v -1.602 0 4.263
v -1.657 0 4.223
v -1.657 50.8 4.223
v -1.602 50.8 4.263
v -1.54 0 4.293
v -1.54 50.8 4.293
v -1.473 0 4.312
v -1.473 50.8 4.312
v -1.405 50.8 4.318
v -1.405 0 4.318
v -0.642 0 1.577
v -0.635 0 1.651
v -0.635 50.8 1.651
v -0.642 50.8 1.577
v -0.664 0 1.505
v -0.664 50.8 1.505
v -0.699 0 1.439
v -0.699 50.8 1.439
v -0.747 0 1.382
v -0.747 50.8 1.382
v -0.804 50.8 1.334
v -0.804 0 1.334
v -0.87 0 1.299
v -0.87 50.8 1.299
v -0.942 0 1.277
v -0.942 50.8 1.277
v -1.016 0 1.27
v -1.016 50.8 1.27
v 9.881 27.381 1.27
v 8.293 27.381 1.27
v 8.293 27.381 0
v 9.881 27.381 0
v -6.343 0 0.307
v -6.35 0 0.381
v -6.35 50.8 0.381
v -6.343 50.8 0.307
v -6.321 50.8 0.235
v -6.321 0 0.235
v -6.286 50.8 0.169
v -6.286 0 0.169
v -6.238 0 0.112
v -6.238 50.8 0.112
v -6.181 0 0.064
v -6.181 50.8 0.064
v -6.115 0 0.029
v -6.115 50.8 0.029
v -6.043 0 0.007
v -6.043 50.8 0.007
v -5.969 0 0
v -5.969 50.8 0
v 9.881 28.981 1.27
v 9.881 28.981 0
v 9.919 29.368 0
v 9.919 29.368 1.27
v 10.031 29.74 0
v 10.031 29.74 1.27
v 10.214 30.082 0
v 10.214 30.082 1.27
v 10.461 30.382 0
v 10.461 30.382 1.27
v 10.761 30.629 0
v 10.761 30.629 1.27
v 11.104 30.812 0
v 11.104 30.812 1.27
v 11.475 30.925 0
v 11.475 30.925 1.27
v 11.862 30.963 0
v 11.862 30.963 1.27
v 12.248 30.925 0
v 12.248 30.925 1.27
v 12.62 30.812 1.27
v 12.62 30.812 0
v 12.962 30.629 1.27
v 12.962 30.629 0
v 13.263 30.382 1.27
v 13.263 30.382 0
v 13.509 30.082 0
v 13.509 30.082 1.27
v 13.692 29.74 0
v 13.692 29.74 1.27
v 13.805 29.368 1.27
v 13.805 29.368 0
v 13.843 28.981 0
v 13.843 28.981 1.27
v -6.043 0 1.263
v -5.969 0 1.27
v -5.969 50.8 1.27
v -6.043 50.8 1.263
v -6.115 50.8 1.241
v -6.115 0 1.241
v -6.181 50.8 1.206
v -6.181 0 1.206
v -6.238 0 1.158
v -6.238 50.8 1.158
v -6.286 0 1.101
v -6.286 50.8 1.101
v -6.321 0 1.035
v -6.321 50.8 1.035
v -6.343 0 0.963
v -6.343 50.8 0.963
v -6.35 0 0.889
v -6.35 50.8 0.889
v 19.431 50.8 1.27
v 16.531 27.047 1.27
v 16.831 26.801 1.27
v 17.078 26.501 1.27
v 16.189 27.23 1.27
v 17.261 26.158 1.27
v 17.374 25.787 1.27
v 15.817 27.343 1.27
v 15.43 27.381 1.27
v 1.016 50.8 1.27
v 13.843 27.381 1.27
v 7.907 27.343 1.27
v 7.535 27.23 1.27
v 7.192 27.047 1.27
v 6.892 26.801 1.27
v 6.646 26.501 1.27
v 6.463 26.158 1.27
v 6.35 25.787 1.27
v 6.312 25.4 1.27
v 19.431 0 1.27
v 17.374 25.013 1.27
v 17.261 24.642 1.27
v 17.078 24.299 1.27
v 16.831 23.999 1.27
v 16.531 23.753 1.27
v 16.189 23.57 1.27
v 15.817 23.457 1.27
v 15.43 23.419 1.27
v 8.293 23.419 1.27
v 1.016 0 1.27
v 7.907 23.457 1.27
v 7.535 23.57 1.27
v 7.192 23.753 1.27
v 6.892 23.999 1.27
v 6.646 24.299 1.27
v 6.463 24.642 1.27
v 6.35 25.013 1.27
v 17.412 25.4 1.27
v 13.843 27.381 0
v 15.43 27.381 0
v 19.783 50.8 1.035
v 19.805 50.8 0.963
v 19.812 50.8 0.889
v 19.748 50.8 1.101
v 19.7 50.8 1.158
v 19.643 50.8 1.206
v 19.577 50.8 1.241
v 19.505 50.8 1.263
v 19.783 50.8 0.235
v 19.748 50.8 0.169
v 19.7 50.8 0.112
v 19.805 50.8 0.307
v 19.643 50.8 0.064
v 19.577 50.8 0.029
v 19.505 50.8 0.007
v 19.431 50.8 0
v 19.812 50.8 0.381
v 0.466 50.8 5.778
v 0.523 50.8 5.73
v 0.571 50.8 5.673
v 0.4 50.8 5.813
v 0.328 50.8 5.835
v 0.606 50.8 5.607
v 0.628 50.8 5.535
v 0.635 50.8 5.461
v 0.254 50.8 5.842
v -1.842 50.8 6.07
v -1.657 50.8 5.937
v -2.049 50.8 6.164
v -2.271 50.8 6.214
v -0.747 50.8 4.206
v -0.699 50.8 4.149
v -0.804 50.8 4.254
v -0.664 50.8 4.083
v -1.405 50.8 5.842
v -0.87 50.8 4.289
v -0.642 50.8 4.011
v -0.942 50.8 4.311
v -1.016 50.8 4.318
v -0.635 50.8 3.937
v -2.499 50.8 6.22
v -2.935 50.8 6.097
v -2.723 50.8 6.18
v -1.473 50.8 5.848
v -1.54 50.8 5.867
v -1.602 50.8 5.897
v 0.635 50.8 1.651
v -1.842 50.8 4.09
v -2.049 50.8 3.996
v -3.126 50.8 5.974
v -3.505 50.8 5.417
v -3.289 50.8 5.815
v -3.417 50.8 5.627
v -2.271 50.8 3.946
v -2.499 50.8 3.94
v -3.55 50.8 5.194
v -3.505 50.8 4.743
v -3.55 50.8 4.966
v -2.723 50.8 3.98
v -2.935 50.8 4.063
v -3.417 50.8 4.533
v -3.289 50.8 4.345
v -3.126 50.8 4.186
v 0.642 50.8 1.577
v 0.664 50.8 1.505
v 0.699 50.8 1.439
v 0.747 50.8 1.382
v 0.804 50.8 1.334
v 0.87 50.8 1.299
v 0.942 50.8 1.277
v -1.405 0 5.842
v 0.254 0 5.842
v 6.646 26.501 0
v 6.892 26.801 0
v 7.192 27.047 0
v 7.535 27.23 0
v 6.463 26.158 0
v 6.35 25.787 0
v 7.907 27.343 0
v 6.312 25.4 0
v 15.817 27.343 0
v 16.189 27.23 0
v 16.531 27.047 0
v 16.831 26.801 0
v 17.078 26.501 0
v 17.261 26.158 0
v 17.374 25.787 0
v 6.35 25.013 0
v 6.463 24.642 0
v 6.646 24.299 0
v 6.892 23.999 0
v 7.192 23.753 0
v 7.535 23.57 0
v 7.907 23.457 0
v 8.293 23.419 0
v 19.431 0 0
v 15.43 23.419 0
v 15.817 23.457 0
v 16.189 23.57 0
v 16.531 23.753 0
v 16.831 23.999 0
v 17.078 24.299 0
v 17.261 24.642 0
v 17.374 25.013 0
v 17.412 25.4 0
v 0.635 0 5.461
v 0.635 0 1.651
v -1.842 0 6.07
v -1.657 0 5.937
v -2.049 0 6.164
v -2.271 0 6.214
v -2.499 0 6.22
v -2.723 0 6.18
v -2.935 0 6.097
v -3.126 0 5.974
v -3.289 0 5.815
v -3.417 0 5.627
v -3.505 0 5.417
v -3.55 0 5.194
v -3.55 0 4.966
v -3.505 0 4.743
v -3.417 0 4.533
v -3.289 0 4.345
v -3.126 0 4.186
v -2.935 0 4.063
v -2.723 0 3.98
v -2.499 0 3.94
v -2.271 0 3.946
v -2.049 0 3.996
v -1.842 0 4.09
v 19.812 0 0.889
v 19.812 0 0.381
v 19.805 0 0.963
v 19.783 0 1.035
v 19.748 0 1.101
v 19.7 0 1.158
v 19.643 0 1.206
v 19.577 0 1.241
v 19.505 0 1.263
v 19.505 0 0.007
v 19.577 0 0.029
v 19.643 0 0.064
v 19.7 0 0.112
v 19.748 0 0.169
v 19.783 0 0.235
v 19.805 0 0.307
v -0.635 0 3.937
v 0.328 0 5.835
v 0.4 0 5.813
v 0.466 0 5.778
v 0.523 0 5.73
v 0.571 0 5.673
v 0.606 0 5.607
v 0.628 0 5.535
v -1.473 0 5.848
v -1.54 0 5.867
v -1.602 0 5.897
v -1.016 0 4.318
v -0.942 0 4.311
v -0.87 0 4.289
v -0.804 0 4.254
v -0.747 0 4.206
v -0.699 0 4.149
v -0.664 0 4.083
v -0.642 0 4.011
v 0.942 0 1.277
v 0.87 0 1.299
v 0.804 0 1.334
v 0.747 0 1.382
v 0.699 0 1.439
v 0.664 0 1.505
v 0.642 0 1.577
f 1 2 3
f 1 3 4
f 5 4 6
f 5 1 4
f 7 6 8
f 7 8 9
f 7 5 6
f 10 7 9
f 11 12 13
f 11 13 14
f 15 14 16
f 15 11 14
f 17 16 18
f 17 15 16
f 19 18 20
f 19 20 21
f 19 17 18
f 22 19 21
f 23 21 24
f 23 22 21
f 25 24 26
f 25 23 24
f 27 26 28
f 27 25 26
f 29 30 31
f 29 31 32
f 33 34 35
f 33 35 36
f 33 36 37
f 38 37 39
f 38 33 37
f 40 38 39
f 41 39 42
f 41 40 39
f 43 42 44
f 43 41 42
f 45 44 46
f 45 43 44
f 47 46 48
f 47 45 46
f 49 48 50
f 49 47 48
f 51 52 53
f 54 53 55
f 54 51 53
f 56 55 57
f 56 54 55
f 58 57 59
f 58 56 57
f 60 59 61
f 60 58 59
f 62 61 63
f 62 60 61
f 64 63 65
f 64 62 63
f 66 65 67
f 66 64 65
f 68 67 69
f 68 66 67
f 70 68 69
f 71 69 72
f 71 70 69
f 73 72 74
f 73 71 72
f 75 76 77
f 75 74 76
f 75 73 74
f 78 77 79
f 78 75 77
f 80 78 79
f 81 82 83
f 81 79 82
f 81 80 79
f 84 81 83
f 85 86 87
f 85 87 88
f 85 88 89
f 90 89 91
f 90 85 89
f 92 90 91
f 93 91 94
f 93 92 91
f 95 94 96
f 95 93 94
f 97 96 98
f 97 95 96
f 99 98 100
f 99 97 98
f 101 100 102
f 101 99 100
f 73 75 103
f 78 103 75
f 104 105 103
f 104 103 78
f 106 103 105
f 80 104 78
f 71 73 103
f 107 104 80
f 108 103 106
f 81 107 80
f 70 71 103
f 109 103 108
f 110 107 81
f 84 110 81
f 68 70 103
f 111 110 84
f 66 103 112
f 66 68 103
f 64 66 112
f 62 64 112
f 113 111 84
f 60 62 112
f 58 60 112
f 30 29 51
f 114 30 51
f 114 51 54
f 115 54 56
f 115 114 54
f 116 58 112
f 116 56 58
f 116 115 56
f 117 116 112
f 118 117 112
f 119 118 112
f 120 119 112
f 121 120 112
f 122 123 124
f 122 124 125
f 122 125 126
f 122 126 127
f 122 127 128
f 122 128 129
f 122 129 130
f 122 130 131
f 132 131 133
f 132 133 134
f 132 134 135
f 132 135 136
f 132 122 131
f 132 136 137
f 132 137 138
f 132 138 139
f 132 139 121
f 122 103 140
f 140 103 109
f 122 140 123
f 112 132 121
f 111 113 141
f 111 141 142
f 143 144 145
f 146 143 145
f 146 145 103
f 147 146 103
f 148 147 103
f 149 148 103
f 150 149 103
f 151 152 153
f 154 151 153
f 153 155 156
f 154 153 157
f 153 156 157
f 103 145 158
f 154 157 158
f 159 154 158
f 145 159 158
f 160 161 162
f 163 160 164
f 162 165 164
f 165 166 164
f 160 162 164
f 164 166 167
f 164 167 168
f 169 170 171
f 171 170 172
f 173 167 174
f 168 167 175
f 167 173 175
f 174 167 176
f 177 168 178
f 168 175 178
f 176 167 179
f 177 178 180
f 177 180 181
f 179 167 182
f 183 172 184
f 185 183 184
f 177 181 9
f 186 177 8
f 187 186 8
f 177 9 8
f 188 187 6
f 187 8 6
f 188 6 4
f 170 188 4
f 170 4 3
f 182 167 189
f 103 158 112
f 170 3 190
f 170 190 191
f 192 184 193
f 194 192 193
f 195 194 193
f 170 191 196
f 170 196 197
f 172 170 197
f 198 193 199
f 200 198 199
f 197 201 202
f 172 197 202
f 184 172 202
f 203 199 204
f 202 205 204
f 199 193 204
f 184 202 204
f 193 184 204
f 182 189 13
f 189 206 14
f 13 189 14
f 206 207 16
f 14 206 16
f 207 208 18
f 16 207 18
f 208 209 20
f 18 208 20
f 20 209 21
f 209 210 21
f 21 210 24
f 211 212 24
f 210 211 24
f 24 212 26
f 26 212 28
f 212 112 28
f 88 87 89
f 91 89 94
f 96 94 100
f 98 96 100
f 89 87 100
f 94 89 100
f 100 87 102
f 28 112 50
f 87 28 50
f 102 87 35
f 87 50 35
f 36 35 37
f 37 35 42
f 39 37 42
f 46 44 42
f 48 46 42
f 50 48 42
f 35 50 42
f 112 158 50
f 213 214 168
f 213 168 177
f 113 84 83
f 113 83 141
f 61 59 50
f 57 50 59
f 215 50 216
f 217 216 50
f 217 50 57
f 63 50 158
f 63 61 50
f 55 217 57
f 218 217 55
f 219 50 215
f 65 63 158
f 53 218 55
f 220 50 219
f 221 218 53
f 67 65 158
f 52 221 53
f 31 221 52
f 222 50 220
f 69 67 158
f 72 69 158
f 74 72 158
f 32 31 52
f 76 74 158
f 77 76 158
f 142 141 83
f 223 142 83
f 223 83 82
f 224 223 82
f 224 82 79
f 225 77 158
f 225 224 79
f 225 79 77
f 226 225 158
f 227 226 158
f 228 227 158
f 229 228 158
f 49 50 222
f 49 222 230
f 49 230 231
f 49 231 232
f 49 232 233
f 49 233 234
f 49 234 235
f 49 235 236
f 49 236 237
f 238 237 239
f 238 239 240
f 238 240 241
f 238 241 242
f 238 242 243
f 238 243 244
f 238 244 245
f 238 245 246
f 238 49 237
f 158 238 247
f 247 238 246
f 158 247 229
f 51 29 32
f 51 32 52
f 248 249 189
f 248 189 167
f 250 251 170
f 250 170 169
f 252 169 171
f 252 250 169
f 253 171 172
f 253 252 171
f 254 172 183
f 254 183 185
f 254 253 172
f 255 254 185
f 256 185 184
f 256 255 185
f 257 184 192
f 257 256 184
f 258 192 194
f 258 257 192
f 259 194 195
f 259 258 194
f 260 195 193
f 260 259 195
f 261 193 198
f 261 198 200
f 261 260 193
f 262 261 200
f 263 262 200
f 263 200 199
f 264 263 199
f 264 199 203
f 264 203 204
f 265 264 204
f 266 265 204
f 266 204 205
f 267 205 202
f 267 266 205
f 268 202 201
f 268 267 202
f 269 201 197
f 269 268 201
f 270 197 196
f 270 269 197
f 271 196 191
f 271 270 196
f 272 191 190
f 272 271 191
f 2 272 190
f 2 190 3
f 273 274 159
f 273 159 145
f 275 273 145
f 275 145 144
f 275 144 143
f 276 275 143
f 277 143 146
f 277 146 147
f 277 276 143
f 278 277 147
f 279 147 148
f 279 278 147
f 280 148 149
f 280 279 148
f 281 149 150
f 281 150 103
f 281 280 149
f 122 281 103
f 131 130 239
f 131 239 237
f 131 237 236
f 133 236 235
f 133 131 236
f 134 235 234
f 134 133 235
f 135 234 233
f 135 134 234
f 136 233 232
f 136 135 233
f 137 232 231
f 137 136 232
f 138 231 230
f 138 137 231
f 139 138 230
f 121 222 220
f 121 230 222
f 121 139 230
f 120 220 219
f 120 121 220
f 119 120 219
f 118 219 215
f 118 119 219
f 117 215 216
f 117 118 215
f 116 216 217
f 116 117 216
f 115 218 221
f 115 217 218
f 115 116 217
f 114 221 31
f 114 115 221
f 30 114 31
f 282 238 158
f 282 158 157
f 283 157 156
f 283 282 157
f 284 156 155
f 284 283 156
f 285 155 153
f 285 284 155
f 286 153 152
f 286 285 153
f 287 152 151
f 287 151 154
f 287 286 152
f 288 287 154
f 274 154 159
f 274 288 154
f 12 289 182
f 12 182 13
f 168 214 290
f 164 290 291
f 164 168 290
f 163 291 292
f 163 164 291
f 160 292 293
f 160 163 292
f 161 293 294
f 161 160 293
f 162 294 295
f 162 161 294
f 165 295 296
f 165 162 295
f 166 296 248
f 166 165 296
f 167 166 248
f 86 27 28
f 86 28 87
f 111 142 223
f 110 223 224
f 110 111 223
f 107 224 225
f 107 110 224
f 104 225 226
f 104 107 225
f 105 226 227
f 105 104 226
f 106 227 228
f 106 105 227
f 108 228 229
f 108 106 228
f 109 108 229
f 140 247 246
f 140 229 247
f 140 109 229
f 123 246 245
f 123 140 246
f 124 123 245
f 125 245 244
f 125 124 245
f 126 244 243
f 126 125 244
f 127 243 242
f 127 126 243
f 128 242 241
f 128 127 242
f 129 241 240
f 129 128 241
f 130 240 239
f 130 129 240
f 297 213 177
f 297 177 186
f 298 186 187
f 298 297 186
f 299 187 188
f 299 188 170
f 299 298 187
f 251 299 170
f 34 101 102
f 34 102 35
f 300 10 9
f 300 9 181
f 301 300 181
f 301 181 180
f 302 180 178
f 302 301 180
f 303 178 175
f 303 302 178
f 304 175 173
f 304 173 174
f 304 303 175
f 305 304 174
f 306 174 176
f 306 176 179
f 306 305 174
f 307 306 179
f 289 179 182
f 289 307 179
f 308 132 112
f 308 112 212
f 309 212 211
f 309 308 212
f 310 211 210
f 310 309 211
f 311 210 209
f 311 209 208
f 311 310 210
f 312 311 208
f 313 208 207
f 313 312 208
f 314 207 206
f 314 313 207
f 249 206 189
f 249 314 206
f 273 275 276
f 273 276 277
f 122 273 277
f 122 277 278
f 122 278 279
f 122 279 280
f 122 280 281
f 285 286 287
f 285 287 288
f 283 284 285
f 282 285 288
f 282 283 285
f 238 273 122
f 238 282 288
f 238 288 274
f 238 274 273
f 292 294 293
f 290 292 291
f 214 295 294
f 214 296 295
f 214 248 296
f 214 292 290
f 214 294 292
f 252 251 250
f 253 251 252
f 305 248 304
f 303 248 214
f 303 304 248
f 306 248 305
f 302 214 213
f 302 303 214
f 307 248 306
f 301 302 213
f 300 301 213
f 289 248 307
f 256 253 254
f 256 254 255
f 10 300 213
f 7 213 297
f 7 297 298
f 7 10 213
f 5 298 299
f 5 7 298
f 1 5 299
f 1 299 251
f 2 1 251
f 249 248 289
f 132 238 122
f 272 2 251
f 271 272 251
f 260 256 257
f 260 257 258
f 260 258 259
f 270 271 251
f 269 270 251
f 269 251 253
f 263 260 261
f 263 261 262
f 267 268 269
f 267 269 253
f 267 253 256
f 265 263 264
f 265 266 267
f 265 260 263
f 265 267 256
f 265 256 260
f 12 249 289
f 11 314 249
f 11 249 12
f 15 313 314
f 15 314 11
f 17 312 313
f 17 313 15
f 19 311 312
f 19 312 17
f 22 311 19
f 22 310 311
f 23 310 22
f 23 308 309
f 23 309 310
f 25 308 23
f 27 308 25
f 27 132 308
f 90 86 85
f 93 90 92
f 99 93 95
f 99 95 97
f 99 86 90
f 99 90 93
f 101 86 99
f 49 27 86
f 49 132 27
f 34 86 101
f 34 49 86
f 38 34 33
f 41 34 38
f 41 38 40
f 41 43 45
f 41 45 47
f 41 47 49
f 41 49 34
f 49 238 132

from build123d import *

# Parameters (mm, degrees)
BOSS_EXTRUDE1_DEPTH = 50.8
SKETCH4_W           = 2.921
SKETCH4_H           = 4.572
CUT_EXTRUDE2_DEPTH  = 51.8
FILLET1_R           = 0.381
CUT_EXTRUDE1_DEPTH  = 2.27


with BuildPart() as part:
    # Sketch2 → Boss-Extrude1 (new body)
    with BuildSketch(Plane(origin=(0, 0, 0), x_dir=(1, 0, 0), z_dir=(0, 1, 0))):
        with BuildLine():
            Line((-5.969, 0), (19.431, 0))
            ThreePointArc((19.431, 0), (19.700407684, -0.111592316), (19.812, -0.381))
            Line((19.812, -0.381), (19.812, -0.889))
            ThreePointArc((19.812, -0.889), (19.700407684, -1.158407684), (19.431, -1.27))
            Line((19.431, -1.27), (1.016, -1.27))
            ThreePointArc((1.016, -1.27), (0.746592316, -1.381592316), (0.635, -1.651))
            Line((0.635, -1.651), (0.635, -3.937))
            ThreePointArc((0.635, -3.937), (0.746592316, -4.206407684), (1.016, -4.318))
            Line((1.016, -4.318), (1.40496875, -4.318))
            ThreePointArc((1.40496875, -4.318), (1.539672592, -4.293392866), (1.656976563, -4.22275))
            ThreePointArc((1.656976563, -4.22275), (3.556, -5.08), (1.656976563, -5.93725))
            ThreePointArc((1.656976563, -5.93725), (1.539672592, -5.866607134), (1.40496875, -5.842))
            Line((1.40496875, -5.842), (-1.40496875, -5.842))
            ThreePointArc((-1.40496875, -5.842), (-1.539672592, -5.866607134), (-1.656976563, -5.93725))
            ThreePointArc((-1.656976563, -5.93725), (-3.556, -5.08), (-1.656976563, -4.22275))
            ThreePointArc((-1.656976563, -4.22275), (-1.539672592, -4.293392866), (-1.40496875, -4.318))
            Line((-1.40496875, -4.318), (-1.016, -4.318))
            ThreePointArc((-1.016, -4.318), (-0.746592316, -4.206407684), (-0.635, -3.937))
            Line((-0.635, -3.937), (-0.635, -1.651))
            ThreePointArc((-0.635, -1.651), (-0.746592316, -1.381592316), (-1.016, -1.27))
            Line((-1.016, -1.27), (-5.969, -1.27))
            ThreePointArc((-5.969, -1.27), (-6.238407684, -1.158407684), (-6.35, -0.889))
            Line((-6.35, -0.889), (-6.35, -0.381))
            ThreePointArc((-6.35, -0.381), (-6.238407684, -0.111592316), (-5.969, 0))
        make_face()
    extrude(amount=BOSS_EXTRUDE1_DEPTH)

    # Sketch4 → Cut-Extrude2 (cut, through all)
    with BuildSketch(Plane.XZ):
        with Locations((2.0955, 3.937)):
            Rectangle(SKETCH4_W, SKETCH4_H)
    extrude(amount=-CUT_EXTRUDE2_DEPTH, mode=Mode.SUBTRACT)

    # Fillet1
    fillet1_edges = [part.edges().sort_by_distance(p)[0] for p in [
        (0.635, 25.4, 5.842),
    ]]
    fillet(fillet1_edges, radius=FILLET1_R)

    # Sketch3 → Cut-Extrude1 (cut, through all)
    with BuildSketch(Plane.XY.offset(1.27)):
        with BuildLine():
            Line((8.2931, 27.3812), (9.8806, 27.3812))
            Line((9.8806, 27.3812), (9.8806, 28.9814))
            ThreePointArc((9.8806, 28.9814), (11.8618, 30.9626), (13.843, 28.9814))
            Line((13.843, 28.9814), (13.843, 27.3812))
            Line((13.843, 27.3812), (15.4305, 27.3812))
            ThreePointArc((15.4305, 27.3812), (17.4117, 25.4), (15.4305, 23.4188))
            Line((15.4305, 23.4188), (8.2931, 23.4188))
            ThreePointArc((8.2931, 23.4188), (6.3119, 25.4), (8.2931, 27.3812))
        make_face()
    extrude(amount=-CUT_EXTRUDE1_DEPTH, mode=Mode.SUBTRACT)


solid = part.part
